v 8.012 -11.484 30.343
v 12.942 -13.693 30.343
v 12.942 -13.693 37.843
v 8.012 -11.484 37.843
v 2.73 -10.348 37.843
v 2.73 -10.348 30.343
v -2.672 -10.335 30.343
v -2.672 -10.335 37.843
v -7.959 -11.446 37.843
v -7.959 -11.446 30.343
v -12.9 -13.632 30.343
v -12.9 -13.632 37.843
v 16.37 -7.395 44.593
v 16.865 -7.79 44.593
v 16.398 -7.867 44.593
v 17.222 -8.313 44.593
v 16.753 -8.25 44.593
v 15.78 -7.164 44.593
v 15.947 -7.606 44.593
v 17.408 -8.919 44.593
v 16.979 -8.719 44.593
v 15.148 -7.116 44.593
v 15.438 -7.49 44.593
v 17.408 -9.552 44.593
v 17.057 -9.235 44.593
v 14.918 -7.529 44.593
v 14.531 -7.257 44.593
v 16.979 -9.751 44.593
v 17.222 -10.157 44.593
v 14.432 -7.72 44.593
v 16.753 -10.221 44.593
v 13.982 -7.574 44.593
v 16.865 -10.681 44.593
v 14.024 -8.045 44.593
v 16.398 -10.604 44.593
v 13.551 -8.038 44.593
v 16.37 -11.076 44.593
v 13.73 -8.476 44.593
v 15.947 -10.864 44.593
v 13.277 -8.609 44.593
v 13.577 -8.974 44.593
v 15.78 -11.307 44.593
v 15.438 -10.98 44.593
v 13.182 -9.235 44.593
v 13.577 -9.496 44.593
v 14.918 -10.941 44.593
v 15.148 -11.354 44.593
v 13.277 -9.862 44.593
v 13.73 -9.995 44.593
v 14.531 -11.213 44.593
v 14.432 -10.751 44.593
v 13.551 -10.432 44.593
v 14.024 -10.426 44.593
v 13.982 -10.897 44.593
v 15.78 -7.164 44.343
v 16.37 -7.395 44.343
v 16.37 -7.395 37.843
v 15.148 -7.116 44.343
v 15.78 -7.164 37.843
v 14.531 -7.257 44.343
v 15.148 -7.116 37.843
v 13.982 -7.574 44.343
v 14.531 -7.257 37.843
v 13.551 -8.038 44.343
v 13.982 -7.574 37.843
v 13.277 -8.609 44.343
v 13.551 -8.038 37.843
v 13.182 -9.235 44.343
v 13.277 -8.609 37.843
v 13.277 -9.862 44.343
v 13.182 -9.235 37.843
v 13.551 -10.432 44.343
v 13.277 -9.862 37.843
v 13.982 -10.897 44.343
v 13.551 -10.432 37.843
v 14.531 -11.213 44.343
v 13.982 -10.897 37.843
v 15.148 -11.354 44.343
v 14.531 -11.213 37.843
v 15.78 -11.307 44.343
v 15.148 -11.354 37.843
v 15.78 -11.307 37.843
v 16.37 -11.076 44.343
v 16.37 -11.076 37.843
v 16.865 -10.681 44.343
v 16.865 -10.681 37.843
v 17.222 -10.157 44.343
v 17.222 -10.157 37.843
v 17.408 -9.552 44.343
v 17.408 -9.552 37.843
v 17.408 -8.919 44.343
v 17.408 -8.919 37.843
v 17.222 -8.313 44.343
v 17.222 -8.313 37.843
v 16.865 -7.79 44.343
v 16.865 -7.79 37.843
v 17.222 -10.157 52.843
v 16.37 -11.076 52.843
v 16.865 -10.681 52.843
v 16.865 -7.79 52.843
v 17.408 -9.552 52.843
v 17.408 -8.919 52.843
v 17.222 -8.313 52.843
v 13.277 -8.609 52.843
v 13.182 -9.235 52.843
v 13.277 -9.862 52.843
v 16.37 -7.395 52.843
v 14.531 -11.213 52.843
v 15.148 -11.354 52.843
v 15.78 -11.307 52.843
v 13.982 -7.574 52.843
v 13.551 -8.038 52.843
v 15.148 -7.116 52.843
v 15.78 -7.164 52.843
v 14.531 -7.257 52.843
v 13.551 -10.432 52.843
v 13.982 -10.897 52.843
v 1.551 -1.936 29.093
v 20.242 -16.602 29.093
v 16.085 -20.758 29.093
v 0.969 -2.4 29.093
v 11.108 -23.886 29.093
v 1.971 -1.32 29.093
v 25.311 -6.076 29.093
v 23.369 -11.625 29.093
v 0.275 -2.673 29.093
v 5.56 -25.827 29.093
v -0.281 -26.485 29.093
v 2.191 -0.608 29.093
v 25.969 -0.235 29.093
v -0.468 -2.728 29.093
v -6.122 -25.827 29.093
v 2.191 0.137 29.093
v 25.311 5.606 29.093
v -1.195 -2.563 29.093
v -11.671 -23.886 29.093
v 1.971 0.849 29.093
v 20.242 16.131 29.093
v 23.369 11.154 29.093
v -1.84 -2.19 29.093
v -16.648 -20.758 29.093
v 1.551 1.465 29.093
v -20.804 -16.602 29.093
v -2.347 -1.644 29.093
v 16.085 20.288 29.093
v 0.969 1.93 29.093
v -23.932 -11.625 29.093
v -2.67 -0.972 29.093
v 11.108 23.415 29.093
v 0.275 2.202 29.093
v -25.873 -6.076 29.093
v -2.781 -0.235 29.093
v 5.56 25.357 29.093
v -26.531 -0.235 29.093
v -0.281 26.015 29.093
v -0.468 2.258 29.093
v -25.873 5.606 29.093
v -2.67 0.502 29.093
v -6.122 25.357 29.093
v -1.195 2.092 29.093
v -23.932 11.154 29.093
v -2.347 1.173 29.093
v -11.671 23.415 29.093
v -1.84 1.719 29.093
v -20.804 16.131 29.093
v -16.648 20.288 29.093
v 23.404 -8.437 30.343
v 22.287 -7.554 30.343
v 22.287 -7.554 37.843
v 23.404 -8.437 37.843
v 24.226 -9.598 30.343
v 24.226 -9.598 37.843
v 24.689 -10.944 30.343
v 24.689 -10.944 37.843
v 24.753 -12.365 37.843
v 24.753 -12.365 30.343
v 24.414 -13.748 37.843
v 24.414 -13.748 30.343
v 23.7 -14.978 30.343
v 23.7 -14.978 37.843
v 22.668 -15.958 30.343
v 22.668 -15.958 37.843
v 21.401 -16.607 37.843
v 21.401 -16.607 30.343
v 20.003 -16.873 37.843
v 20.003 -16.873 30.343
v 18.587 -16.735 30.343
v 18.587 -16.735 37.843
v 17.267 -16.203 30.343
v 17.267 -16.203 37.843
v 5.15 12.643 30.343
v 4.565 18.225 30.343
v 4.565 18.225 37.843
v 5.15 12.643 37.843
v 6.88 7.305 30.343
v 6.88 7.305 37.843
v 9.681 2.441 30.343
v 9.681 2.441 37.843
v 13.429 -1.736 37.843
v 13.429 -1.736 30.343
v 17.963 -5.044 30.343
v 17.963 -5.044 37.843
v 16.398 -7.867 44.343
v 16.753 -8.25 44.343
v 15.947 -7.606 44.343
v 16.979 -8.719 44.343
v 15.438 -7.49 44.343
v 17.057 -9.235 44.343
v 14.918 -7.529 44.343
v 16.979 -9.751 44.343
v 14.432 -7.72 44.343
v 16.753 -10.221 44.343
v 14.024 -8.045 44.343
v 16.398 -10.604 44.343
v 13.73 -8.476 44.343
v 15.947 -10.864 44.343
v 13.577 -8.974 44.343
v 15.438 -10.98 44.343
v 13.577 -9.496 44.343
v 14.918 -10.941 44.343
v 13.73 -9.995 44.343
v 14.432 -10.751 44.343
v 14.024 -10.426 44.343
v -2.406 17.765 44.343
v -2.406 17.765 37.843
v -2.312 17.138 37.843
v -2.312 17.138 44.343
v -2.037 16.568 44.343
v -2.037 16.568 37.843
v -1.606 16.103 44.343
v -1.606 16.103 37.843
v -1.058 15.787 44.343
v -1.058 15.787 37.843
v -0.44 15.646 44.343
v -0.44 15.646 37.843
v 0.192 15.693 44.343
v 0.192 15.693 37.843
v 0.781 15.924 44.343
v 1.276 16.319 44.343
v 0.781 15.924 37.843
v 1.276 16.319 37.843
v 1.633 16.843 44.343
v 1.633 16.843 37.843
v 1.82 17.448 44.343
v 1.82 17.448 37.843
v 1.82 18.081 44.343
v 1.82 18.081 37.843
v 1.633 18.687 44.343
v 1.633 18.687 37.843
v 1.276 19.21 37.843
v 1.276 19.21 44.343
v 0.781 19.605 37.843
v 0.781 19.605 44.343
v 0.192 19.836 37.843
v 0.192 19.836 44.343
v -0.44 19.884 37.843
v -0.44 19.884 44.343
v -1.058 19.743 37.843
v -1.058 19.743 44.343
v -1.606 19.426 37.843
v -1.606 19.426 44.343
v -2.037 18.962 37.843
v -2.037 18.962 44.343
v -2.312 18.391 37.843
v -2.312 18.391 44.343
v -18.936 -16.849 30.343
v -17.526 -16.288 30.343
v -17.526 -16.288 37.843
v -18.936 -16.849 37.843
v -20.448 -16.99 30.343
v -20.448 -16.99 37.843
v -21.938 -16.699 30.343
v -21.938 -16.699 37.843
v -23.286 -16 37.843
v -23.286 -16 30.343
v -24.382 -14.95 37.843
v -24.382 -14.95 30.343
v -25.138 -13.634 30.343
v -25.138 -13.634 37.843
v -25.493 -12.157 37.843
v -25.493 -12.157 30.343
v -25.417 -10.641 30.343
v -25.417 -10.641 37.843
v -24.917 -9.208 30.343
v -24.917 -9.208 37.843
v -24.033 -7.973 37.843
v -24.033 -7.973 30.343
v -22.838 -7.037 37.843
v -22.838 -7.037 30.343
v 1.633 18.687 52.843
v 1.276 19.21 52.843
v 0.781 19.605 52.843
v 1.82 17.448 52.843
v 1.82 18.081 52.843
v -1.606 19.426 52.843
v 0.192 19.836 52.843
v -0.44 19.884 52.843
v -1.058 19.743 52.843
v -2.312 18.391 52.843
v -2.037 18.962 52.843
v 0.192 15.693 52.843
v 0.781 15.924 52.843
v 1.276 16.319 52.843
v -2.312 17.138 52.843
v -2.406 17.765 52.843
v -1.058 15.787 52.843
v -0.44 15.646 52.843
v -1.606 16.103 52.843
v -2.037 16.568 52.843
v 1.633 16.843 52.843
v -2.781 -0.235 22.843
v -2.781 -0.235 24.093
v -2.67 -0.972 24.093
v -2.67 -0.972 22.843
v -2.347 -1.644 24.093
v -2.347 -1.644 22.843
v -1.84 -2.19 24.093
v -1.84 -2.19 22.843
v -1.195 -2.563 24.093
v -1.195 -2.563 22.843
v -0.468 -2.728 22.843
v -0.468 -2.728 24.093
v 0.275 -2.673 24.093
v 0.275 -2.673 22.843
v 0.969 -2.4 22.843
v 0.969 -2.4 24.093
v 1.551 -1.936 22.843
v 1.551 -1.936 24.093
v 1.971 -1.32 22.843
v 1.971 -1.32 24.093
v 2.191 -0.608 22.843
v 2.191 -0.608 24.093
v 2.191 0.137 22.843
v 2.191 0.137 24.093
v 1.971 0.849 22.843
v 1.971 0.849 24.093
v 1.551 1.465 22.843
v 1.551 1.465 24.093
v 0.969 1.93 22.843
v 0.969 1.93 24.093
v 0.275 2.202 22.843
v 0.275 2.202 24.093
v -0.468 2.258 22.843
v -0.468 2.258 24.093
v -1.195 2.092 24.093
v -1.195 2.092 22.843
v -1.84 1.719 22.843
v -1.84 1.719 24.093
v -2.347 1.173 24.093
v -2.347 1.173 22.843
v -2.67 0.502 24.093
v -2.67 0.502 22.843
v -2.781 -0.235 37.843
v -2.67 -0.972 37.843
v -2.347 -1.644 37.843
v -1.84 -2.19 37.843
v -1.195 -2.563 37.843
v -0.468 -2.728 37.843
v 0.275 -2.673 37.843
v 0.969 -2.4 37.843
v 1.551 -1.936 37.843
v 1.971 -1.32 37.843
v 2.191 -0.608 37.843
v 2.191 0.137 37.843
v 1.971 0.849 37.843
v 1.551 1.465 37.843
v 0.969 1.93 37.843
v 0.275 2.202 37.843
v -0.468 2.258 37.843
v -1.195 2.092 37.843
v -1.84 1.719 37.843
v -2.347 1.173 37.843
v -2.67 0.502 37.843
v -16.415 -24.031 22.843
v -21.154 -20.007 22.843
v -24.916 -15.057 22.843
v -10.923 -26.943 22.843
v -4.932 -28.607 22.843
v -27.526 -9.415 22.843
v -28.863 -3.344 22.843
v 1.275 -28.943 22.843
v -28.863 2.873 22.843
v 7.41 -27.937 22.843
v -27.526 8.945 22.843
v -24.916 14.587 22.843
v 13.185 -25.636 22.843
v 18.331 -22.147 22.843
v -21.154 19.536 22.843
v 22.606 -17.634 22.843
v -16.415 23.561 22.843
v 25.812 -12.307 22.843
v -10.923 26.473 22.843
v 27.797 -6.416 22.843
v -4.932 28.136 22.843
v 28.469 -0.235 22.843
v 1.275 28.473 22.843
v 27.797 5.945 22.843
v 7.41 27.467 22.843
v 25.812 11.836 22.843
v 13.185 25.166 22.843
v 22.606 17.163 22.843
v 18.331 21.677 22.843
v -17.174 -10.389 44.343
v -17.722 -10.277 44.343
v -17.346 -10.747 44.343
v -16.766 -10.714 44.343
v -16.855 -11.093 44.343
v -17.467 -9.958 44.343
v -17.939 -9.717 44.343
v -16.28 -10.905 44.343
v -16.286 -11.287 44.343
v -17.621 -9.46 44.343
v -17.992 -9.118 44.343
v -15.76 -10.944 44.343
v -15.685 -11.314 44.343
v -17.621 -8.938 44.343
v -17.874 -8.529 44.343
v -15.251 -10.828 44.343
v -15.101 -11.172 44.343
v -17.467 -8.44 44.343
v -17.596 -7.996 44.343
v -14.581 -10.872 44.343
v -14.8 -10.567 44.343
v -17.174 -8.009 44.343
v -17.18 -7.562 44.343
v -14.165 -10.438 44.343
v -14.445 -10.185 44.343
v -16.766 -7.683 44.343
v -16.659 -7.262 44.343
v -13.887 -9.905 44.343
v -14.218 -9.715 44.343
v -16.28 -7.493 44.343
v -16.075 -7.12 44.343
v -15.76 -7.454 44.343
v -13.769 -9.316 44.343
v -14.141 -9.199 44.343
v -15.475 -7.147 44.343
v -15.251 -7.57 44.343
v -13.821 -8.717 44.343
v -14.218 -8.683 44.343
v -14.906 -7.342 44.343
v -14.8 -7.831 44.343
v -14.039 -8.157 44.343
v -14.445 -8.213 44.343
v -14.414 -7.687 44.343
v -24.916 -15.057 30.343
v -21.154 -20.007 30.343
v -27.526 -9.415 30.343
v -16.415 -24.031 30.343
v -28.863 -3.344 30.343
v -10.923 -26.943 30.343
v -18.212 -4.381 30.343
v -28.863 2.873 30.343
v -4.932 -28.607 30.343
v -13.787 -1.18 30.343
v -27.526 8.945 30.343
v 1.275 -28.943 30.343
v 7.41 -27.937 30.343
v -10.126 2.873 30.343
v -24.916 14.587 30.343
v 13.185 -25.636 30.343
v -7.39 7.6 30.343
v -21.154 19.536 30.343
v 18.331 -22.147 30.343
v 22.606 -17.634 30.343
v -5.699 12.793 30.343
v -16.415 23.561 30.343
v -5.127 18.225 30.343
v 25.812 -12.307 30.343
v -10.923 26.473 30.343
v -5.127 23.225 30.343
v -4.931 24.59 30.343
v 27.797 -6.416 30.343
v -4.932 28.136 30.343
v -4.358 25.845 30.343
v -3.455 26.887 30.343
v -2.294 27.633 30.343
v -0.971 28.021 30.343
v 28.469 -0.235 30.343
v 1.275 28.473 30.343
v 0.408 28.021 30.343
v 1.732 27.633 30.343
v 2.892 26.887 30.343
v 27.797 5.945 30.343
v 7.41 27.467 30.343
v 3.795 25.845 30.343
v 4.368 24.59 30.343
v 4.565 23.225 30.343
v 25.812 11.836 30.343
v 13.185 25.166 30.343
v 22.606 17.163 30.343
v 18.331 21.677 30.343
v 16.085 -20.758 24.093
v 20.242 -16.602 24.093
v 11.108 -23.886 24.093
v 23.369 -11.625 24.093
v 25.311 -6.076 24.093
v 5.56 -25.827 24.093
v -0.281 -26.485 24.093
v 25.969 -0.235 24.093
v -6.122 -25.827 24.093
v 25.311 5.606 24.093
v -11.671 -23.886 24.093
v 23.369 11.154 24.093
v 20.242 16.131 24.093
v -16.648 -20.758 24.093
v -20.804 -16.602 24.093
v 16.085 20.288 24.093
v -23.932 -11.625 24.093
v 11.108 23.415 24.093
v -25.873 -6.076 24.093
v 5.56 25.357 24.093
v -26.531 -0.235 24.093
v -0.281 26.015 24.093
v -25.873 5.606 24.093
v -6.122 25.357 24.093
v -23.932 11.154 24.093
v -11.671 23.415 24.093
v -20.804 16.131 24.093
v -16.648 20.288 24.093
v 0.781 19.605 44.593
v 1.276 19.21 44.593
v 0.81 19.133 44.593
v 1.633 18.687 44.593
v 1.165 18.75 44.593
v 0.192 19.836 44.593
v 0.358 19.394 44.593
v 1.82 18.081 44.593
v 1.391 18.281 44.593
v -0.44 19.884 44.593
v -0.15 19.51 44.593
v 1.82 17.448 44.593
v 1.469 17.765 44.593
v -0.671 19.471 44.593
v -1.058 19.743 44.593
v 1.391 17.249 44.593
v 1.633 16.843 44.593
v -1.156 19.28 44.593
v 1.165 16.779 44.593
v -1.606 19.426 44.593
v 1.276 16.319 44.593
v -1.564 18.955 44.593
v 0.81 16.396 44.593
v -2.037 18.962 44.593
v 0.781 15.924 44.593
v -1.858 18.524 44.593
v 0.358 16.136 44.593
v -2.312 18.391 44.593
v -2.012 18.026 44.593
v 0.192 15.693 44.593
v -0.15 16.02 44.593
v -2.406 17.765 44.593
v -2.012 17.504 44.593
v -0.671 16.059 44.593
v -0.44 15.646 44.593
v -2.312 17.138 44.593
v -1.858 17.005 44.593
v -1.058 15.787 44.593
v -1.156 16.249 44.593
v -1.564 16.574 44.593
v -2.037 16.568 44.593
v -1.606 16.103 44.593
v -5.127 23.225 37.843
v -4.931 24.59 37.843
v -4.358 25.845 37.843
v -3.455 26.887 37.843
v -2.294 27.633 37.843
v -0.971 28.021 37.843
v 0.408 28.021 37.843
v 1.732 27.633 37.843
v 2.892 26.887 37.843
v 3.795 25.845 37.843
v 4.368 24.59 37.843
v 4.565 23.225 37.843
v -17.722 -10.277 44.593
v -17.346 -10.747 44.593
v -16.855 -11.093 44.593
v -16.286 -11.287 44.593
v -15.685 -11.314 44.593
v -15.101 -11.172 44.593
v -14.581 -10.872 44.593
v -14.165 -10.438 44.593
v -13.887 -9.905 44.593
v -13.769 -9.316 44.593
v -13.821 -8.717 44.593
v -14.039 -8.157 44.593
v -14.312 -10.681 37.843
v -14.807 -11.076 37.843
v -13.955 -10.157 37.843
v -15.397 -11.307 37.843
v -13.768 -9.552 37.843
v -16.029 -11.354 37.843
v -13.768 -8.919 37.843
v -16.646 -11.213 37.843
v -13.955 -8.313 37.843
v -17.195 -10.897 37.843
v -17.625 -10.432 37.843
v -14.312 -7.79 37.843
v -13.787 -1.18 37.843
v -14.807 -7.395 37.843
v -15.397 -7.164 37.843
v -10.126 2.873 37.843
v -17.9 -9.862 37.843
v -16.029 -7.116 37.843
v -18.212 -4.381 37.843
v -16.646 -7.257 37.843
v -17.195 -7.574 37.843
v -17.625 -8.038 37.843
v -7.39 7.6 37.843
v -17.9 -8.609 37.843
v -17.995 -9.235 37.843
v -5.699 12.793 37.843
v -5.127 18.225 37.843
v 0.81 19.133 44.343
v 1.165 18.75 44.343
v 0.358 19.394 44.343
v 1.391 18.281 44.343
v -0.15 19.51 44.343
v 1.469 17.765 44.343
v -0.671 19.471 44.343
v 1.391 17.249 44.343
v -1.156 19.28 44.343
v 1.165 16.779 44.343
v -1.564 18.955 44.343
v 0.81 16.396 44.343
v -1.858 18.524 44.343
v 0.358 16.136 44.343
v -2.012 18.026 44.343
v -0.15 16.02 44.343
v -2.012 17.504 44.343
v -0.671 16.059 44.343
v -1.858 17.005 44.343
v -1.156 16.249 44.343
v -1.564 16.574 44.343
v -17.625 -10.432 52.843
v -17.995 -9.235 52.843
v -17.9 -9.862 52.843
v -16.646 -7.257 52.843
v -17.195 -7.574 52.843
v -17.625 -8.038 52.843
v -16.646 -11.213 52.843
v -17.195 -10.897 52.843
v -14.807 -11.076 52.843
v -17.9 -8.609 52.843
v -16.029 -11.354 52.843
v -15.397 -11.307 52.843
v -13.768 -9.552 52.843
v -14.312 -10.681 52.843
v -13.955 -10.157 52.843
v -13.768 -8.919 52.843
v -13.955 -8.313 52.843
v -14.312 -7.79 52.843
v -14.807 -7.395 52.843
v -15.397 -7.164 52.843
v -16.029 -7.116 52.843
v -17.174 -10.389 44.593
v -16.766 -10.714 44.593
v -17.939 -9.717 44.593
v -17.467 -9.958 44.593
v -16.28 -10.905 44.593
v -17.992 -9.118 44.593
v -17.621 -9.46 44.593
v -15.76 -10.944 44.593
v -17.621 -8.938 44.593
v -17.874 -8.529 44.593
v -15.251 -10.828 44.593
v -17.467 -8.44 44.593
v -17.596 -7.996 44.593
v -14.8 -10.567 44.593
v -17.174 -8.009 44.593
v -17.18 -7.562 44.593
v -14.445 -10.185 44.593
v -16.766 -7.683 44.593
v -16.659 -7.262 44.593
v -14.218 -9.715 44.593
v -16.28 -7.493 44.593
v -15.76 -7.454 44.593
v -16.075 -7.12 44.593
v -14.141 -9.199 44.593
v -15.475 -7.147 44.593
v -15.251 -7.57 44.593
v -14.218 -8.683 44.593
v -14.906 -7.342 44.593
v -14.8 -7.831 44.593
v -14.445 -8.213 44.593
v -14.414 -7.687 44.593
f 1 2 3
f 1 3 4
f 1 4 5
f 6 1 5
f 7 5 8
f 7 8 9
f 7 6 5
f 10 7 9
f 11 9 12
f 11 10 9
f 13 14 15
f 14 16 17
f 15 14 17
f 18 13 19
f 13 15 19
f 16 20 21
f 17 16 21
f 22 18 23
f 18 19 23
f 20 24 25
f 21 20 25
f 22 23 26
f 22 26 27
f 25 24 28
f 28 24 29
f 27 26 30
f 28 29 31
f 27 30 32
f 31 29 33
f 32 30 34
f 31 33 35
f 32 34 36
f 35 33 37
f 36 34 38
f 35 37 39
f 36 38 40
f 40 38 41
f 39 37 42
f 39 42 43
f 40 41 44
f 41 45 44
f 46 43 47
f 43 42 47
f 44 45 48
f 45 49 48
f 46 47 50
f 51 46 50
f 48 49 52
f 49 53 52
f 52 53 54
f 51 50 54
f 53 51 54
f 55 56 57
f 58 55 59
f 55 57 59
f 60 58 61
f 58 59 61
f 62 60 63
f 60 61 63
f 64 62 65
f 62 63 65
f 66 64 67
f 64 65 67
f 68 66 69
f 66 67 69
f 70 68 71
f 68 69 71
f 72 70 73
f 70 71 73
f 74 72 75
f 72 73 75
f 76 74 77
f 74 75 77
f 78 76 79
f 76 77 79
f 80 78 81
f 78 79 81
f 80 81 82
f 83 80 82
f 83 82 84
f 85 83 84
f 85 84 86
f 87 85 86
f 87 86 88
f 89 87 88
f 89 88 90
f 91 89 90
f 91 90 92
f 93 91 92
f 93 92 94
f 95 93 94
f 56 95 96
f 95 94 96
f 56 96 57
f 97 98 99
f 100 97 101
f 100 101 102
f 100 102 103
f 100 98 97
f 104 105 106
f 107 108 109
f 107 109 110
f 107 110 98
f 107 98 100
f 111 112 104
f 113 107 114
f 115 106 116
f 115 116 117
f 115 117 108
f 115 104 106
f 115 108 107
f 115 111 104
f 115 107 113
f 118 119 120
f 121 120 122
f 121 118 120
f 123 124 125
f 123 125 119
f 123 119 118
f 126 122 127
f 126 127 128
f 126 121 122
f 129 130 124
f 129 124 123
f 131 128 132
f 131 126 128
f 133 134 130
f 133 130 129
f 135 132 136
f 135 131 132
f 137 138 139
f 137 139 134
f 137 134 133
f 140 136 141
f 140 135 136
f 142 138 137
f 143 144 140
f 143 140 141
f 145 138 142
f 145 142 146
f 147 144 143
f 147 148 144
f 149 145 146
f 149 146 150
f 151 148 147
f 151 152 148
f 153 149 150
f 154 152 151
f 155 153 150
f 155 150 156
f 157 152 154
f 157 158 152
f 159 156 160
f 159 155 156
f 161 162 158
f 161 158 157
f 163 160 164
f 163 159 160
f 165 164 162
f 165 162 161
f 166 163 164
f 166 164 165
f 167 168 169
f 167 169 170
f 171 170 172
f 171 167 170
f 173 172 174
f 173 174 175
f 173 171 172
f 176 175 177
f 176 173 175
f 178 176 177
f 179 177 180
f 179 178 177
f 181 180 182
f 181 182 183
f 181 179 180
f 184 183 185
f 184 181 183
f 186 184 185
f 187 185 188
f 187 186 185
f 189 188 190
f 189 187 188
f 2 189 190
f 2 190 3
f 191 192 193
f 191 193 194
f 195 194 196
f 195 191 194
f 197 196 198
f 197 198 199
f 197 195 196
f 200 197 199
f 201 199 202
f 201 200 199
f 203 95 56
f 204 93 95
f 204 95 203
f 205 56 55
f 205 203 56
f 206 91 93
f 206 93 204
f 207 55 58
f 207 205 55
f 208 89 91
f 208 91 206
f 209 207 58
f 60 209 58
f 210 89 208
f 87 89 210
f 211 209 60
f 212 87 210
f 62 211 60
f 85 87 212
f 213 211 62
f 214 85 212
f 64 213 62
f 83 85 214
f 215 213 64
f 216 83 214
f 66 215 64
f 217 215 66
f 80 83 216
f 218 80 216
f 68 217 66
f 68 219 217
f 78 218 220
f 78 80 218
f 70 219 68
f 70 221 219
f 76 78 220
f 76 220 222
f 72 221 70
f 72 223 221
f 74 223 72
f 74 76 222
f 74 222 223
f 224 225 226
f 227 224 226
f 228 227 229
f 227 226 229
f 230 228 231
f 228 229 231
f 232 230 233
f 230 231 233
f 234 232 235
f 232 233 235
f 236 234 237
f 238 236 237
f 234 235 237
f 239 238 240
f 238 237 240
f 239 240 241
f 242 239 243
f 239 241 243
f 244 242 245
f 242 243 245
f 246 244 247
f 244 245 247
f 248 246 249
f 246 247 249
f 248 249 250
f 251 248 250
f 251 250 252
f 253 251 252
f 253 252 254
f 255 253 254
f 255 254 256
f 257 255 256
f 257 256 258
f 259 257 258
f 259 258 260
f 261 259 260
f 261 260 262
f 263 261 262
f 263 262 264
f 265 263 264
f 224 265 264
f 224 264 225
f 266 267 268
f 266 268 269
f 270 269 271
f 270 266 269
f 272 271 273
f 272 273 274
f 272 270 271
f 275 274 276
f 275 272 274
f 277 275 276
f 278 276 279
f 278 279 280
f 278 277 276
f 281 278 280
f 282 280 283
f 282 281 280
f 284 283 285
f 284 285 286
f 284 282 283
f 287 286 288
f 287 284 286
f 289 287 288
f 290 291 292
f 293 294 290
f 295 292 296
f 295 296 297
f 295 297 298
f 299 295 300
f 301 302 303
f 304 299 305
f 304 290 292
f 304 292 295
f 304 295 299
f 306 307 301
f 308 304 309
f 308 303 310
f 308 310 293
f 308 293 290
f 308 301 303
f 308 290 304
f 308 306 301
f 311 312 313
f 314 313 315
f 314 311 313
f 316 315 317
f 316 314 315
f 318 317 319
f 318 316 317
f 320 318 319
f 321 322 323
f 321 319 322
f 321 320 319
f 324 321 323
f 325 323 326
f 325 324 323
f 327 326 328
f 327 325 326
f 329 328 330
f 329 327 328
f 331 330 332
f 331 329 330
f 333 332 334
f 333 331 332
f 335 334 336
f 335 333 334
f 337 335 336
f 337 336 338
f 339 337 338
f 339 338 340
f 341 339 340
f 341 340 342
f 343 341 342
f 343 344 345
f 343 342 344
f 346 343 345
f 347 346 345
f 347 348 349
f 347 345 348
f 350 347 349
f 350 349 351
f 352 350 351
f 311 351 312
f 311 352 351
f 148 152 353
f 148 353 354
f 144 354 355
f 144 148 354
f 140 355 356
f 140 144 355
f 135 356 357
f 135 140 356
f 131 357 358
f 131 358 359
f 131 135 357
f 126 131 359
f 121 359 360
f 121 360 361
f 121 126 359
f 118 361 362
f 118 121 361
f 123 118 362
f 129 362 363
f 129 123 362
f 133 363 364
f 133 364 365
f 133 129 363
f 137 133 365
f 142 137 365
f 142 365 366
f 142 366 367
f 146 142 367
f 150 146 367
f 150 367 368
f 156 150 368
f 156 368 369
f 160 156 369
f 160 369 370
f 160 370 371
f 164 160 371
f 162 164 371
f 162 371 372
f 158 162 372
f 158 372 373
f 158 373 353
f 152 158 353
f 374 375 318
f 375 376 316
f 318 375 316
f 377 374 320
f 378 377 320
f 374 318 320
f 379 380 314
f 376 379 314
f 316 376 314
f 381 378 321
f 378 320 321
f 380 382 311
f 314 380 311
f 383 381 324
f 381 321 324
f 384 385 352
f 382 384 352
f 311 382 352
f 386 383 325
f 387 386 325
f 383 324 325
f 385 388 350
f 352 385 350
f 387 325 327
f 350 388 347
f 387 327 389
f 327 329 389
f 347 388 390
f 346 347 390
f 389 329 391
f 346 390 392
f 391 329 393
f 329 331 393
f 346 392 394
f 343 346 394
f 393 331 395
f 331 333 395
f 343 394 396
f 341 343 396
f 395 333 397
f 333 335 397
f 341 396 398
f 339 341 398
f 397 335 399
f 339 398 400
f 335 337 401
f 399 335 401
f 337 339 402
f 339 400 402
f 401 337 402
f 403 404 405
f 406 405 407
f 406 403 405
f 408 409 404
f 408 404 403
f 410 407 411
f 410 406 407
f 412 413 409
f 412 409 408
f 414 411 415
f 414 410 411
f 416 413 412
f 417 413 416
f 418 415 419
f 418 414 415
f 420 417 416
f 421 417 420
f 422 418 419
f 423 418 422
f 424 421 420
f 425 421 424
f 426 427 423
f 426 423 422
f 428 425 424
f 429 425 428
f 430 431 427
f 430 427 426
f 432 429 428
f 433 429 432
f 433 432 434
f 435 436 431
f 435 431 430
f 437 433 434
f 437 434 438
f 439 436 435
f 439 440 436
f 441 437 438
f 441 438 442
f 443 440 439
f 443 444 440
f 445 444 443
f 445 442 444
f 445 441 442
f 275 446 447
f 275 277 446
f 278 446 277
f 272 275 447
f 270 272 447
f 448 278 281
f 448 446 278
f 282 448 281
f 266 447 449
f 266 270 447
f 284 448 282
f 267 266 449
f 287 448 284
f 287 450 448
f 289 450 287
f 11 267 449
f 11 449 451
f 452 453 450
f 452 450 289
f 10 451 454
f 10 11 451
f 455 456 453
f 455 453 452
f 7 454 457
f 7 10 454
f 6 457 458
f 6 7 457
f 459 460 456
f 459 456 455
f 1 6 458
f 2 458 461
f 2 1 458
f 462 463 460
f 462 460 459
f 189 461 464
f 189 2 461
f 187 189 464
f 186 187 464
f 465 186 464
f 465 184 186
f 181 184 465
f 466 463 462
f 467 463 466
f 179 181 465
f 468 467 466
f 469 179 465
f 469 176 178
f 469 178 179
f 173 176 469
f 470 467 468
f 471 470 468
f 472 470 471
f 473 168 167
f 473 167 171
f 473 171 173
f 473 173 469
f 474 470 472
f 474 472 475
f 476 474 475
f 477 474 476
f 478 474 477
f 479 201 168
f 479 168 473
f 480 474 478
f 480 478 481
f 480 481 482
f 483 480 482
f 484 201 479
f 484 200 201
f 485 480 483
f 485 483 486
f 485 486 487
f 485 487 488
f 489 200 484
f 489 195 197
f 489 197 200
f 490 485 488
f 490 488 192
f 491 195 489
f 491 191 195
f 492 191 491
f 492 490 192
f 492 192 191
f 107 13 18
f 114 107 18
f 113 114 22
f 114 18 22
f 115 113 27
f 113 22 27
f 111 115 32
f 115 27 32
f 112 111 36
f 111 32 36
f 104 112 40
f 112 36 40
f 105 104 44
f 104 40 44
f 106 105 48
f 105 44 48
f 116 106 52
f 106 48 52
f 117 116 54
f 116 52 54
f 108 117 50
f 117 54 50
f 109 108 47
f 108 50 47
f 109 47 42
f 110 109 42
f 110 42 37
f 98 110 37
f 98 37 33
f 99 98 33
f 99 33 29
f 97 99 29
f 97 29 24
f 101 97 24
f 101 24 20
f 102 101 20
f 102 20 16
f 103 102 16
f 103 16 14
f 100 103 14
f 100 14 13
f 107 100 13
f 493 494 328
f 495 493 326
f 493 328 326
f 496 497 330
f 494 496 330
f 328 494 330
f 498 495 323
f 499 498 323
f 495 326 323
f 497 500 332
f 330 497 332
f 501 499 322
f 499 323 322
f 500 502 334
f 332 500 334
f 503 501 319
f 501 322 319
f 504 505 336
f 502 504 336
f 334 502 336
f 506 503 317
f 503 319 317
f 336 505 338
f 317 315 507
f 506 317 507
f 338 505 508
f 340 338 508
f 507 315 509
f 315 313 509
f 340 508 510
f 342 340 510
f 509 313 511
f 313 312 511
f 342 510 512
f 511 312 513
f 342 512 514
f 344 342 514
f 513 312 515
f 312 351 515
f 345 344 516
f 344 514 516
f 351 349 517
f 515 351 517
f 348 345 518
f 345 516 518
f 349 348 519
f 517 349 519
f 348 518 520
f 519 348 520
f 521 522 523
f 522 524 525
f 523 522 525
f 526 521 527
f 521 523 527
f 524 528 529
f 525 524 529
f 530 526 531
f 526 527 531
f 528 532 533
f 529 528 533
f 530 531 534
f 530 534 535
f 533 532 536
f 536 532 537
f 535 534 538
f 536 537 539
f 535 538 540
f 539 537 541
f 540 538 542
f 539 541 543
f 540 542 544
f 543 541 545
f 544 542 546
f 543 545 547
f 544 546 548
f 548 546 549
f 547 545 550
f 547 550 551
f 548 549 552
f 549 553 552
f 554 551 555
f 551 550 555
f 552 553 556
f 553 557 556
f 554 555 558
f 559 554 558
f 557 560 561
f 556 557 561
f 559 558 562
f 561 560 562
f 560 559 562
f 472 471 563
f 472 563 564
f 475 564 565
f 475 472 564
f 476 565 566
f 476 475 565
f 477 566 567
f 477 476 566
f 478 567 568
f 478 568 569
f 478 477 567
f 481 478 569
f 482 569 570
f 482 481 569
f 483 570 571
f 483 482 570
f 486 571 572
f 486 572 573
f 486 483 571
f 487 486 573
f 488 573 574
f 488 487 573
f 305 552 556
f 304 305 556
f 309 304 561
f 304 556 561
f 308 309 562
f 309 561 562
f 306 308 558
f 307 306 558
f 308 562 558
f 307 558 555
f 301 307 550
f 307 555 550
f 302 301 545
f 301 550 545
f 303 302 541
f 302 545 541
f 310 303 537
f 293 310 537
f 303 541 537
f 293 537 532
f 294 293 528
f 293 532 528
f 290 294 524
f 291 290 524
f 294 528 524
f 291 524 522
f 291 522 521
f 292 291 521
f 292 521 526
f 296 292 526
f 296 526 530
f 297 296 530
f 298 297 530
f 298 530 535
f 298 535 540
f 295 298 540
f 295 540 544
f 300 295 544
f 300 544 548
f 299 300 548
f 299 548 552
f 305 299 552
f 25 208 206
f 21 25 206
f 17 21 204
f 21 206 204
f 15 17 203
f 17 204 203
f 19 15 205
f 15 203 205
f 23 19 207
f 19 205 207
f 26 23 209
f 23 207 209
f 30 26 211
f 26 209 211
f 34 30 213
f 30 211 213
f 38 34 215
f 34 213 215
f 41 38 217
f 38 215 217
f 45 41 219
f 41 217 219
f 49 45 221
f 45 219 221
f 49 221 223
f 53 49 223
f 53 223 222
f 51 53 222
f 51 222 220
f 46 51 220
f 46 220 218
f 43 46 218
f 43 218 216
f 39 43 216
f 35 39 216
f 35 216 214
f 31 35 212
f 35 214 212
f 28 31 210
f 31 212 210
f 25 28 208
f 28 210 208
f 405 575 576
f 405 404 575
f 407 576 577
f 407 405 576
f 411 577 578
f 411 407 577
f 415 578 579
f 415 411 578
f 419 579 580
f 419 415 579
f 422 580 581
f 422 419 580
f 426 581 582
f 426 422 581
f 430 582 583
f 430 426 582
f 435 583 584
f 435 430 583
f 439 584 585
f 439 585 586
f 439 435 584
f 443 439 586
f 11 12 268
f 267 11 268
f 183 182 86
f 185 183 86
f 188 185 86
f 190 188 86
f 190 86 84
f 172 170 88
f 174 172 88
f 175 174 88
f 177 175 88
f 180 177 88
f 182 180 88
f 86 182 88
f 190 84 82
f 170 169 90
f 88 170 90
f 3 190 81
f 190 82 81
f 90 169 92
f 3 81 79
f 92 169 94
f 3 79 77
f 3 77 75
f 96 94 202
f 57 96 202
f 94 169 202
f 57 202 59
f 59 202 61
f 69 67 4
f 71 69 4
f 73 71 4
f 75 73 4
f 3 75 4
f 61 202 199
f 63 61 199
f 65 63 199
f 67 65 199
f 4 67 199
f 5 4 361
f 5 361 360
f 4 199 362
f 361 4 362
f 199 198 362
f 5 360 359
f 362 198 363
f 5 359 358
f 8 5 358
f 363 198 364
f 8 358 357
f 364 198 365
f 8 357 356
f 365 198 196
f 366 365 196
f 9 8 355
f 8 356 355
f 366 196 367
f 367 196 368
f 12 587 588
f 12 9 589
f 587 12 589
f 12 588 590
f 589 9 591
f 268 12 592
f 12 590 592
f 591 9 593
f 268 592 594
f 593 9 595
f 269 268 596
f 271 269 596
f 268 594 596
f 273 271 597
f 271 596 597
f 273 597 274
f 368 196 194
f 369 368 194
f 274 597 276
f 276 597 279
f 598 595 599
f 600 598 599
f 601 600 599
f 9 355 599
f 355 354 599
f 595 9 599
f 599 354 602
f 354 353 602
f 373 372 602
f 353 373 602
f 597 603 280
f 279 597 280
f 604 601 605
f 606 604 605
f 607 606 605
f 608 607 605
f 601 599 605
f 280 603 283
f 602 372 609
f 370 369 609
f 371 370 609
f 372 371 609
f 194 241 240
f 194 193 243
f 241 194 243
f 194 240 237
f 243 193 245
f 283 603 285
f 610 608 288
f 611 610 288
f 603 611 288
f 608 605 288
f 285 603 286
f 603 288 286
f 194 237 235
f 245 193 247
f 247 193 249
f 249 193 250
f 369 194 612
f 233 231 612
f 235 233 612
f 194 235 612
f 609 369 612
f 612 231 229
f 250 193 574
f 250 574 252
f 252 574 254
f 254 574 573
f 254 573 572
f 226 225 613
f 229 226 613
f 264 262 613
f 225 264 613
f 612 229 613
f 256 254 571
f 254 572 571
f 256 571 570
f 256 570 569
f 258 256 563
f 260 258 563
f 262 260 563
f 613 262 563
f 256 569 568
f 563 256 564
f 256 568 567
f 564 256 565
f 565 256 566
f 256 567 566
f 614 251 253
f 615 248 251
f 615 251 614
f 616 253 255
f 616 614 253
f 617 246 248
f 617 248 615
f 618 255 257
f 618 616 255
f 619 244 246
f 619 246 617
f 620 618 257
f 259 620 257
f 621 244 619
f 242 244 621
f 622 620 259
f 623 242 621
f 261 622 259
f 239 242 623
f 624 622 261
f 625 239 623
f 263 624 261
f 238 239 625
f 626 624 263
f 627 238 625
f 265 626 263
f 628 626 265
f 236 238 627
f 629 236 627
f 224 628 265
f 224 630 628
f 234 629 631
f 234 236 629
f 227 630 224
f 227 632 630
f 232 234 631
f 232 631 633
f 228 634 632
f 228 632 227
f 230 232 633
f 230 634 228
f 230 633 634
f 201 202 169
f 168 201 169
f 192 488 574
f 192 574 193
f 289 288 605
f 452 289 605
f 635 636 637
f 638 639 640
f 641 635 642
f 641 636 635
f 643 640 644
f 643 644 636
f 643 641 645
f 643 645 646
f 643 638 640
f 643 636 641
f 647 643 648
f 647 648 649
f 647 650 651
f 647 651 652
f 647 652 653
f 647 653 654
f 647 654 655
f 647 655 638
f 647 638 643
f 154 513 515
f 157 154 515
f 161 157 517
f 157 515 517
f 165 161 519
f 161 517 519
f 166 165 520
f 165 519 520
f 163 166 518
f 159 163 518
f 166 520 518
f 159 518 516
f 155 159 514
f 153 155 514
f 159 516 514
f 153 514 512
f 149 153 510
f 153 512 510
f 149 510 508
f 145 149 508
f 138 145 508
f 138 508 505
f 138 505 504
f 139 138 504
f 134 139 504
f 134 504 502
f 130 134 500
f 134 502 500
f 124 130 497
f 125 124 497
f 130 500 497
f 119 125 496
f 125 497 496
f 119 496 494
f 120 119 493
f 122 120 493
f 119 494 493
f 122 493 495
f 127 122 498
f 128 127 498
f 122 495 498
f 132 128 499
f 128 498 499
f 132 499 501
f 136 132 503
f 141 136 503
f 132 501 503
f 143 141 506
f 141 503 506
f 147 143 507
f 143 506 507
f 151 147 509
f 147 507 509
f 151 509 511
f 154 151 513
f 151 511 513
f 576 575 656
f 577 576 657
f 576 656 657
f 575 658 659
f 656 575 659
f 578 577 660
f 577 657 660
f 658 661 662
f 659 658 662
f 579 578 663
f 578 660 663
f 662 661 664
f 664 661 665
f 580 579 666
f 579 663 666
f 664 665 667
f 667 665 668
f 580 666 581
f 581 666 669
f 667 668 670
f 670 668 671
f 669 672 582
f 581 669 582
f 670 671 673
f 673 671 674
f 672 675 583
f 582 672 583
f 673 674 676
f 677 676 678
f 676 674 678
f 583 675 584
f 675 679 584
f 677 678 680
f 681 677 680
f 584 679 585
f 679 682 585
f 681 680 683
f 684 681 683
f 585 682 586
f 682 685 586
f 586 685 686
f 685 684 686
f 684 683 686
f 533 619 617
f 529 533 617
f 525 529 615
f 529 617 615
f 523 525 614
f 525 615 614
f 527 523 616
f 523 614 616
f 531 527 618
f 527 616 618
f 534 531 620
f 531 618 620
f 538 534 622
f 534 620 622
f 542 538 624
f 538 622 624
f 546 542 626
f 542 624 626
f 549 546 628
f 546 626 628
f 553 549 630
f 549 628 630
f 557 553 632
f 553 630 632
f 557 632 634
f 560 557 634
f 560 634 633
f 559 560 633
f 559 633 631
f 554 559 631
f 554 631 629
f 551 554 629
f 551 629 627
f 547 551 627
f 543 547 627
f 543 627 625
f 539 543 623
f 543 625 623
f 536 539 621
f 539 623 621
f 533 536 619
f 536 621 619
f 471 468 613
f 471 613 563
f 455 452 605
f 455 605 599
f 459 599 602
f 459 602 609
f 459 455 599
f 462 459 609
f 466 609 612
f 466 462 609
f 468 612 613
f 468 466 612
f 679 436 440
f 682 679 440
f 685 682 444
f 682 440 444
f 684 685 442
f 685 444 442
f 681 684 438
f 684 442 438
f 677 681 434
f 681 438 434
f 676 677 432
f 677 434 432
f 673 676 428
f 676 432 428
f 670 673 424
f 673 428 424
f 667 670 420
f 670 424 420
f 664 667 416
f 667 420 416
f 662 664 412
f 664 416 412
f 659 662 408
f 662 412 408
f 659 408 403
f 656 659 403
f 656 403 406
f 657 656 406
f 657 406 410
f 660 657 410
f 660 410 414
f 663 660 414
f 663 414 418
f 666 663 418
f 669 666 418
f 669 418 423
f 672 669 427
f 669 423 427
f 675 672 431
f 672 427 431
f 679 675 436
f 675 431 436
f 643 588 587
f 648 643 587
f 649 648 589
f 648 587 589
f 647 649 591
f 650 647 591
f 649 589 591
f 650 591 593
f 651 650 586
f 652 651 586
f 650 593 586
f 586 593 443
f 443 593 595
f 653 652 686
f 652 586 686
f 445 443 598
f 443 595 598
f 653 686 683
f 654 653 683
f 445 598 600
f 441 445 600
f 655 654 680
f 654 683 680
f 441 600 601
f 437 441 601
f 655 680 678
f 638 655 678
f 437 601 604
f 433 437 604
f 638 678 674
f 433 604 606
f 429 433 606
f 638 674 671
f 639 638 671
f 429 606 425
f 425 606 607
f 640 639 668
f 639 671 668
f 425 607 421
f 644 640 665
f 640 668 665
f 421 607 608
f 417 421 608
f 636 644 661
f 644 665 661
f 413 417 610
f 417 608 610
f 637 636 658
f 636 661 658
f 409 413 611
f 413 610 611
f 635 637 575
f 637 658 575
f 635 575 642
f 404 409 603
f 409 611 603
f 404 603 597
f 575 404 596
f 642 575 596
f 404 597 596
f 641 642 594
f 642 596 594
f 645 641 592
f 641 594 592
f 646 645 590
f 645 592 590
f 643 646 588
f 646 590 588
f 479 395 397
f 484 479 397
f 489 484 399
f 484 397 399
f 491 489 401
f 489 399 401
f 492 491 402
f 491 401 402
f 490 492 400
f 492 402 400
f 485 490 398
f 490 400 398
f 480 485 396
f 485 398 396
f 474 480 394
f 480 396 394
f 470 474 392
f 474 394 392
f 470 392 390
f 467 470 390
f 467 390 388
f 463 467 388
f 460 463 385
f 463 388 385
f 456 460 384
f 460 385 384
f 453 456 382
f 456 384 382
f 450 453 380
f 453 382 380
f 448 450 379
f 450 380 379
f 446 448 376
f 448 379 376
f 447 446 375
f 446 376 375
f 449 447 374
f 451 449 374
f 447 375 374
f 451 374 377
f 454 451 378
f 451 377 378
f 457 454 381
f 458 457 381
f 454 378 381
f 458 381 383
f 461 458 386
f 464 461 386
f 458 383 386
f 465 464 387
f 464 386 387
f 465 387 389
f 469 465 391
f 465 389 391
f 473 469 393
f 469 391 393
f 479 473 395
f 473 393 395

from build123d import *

# Parameters (mm, degrees)
ESQUISSE1_R                  = 115
BOSS_EXTRU_1_DEPTH           = 30
ESQUISSE4_R                  = 10
BOSS_EXTRU_3_DEPTH           = 60
ESQUISSE7_R                  = 8.5
BOSS_EXTRU_4_DEPTH           = 60
R_P_TITION_CIRCULAIRE1_COUNT = 3
ENL_V_START                  = -34
ESQUISSE8_R                  = 8.5
ESQUISSE8_R_2                = 7
ENL_V_MAT_EXTRU_1_DEPTH      = 1
ENL_V_START_2                = -5
ESQUISSE10_R                 = 105
ENL_V_MAT_EXTRU_2_DEPTH      = 20
ECHELLE1_SCALE               = 0.25


with BuildPart() as part:
    # Esquisse1 → Boss.-Extru.1 (new body)
    with BuildSketch(Plane.XY):
        Circle(ESQUISSE1_R)
        with BuildLine():
            Line((-90.226043394, -27.208254638), (-71.724215233, -16.583848882))
            ThreePointArc((-71.724215233, -16.583848882), (-33.409561028, 21.598796439), (-19.383519657, 73.840516299))
            Line((-19.383519657, 73.840516299), (-19.383519657, 93.840516299))
            ThreePointArc((-19.383519657, 93.840516299), (0, 113.224035956), (19.383519657, 93.840516299))
            Line((19.383519657, 93.840516299), (19.383519657, 73.840516299))
            ThreePointArc((19.383519657, 73.840516299), (33.739018197, 20.139465346), (72.975743183, -19.235179086))
            Line((72.975743183, -19.235179086), (90.272811294, -29.275668854))
            ThreePointArc((90.272811294, -29.275668854), (97.529389636, -56.613226732), (70.191831757, -63.869805074))
            Line((70.191831757, -63.869805074), (52.894763647, -53.829315306))
            ThreePointArc((52.894763647, -53.829315306), (1.242076374, -39.859433821), (-50.47540372, -53.587505203))
            Line((-50.47540372, -53.587505203), (-68.97723188, -64.211910959))
            ThreePointArc((-68.97723188, -64.211910959), (-98.103465797, -56.334488555), (-90.226043394, -27.208254638))
        make_face(mode=Mode.SUBTRACT)
    extrude(amount=BOSS_EXTRU_1_DEPTH)

    # Esquisse4 → Boss.-Extru.3 (add)
    with BuildSketch(Plane.XY):
        with BuildLine():
            Line((-90.226043394, -27.208254638), (-71.724215233, -16.583848882))
            ThreePointArc((-71.724215233, -16.583848882), (-33.409561028, 21.598796439), (-19.383519657, 73.840516299))
            Line((-19.383519657, 73.840516299), (-19.383519657, 93.840516299))
            ThreePointArc((-19.383519657, 93.840516299), (0, 113.224035956), (19.383519657, 93.840516299))
            Line((19.383519657, 93.840516299), (19.383519657, 73.840516299))
            ThreePointArc((19.383519657, 73.840516299), (33.739018197, 20.139465346), (72.975743183, -19.235179086))
            Line((72.975743183, -19.235179086), (90.272811294, -29.275668854))
            ThreePointArc((90.272811294, -29.275668854), (97.529389636, -56.613226732), (70.191831757, -63.869805074))
            Line((70.191831757, -63.869805074), (52.894763647, -53.829315306))
            ThreePointArc((52.894763647, -53.829315306), (1.242076374, -39.859433821), (-50.47540372, -53.587505203))
            Line((-50.47540372, -53.587505203), (-68.97723188, -64.211910959))
            ThreePointArc((-68.97723188, -64.211910959), (-98.103465797, -56.334488555), (-90.226043394, -27.208254638))
        make_face()
        with Locations(Location((0, 0, 0), (0, 0, 180))):
            Circle(ESQUISSE4_R, mode=Mode.SUBTRACT)
    extrude(amount=BOSS_EXTRU_3_DEPTH)

    # Esquisse7 → Boss.-Extru.4 (add)
    with BuildSketch(Plane.XY.offset(60)):
        with Locations(Location((0, 72, 0), (0, 0, 180))):
            Circle(ESQUISSE7_R)
    boss_extru_4 = extrude(amount=BOSS_EXTRU_4_DEPTH)

    # Répétition circulaire1: Boss.-Extru.4 ×3 about axis
    r_p_tition_circulaire1_axis = Axis((0, 0, 0), (0, 0, 1))
    for i in range(1, R_P_TITION_CIRCULAIRE1_COUNT):
        add(boss_extru_4.rotate(r_p_tition_circulaire1_axis, i * 360 / R_P_TITION_CIRCULAIRE1_COUNT))

    # Esquisse8 → Enlèv. mat.-Extru.1 (cut)
    # profile 1 of 3: a face of its own
    with BuildSketch(Plane.XY.offset(120).offset(ENL_V_START)):
        with Locations(Location((0, 72, 0), (0, 0, 180))):
            Circle(ESQUISSE8_R)
        with Locations((0, 72)):
            Circle(ESQUISSE8_R_2, mode=Mode.SUBTRACT)
    # profile 2 of 3: a face of its own
    with BuildSketch(Plane.XY.offset(120).offset(ENL_V_START)):
        with Locations((-62.437871739, -35.854039838)):
            Circle(ESQUISSE8_R)
        with Locations((-62.437871739, -35.854039838)):
            Circle(ESQUISSE8_R_2, mode=Mode.SUBTRACT)
    # profile 3 of 3: a face of its own
    with BuildSketch(Plane.XY.offset(120).offset(ENL_V_START)):
        with Locations(Location((62.353829072, -36, 0), (0, 0, 180))):
            Circle(ESQUISSE8_R)
        with Locations((62.353829072, -36)):
            Circle(ESQUISSE8_R_2, mode=Mode.SUBTRACT)
    extrude(amount=ENL_V_MAT_EXTRU_1_DEPTH, mode=Mode.SUBTRACT)

    # Esquisse10 → Enlèv. mat.-Extru.2 (cut)
    with BuildSketch(Plane(origin=(0, 0, 0), x_dir=(-1, 0, 0), z_dir=(0, 0, -1)).offset(ENL_V_START_2)):
        Circle(ESQUISSE10_R)
    extrude(amount=-ENL_V_MAT_EXTRU_2_DEPTH, mode=Mode.SUBTRACT)


with BuildPart() as part_1:
    # Echelle1: scaled about (-0.37502274, -0.313761963, 30.457504843)
    add(part.part.scale(ECHELLE1_SCALE).moved(Location((-0.281267055, -0.235321472, 22.843128632))))


solid = part_1.part
